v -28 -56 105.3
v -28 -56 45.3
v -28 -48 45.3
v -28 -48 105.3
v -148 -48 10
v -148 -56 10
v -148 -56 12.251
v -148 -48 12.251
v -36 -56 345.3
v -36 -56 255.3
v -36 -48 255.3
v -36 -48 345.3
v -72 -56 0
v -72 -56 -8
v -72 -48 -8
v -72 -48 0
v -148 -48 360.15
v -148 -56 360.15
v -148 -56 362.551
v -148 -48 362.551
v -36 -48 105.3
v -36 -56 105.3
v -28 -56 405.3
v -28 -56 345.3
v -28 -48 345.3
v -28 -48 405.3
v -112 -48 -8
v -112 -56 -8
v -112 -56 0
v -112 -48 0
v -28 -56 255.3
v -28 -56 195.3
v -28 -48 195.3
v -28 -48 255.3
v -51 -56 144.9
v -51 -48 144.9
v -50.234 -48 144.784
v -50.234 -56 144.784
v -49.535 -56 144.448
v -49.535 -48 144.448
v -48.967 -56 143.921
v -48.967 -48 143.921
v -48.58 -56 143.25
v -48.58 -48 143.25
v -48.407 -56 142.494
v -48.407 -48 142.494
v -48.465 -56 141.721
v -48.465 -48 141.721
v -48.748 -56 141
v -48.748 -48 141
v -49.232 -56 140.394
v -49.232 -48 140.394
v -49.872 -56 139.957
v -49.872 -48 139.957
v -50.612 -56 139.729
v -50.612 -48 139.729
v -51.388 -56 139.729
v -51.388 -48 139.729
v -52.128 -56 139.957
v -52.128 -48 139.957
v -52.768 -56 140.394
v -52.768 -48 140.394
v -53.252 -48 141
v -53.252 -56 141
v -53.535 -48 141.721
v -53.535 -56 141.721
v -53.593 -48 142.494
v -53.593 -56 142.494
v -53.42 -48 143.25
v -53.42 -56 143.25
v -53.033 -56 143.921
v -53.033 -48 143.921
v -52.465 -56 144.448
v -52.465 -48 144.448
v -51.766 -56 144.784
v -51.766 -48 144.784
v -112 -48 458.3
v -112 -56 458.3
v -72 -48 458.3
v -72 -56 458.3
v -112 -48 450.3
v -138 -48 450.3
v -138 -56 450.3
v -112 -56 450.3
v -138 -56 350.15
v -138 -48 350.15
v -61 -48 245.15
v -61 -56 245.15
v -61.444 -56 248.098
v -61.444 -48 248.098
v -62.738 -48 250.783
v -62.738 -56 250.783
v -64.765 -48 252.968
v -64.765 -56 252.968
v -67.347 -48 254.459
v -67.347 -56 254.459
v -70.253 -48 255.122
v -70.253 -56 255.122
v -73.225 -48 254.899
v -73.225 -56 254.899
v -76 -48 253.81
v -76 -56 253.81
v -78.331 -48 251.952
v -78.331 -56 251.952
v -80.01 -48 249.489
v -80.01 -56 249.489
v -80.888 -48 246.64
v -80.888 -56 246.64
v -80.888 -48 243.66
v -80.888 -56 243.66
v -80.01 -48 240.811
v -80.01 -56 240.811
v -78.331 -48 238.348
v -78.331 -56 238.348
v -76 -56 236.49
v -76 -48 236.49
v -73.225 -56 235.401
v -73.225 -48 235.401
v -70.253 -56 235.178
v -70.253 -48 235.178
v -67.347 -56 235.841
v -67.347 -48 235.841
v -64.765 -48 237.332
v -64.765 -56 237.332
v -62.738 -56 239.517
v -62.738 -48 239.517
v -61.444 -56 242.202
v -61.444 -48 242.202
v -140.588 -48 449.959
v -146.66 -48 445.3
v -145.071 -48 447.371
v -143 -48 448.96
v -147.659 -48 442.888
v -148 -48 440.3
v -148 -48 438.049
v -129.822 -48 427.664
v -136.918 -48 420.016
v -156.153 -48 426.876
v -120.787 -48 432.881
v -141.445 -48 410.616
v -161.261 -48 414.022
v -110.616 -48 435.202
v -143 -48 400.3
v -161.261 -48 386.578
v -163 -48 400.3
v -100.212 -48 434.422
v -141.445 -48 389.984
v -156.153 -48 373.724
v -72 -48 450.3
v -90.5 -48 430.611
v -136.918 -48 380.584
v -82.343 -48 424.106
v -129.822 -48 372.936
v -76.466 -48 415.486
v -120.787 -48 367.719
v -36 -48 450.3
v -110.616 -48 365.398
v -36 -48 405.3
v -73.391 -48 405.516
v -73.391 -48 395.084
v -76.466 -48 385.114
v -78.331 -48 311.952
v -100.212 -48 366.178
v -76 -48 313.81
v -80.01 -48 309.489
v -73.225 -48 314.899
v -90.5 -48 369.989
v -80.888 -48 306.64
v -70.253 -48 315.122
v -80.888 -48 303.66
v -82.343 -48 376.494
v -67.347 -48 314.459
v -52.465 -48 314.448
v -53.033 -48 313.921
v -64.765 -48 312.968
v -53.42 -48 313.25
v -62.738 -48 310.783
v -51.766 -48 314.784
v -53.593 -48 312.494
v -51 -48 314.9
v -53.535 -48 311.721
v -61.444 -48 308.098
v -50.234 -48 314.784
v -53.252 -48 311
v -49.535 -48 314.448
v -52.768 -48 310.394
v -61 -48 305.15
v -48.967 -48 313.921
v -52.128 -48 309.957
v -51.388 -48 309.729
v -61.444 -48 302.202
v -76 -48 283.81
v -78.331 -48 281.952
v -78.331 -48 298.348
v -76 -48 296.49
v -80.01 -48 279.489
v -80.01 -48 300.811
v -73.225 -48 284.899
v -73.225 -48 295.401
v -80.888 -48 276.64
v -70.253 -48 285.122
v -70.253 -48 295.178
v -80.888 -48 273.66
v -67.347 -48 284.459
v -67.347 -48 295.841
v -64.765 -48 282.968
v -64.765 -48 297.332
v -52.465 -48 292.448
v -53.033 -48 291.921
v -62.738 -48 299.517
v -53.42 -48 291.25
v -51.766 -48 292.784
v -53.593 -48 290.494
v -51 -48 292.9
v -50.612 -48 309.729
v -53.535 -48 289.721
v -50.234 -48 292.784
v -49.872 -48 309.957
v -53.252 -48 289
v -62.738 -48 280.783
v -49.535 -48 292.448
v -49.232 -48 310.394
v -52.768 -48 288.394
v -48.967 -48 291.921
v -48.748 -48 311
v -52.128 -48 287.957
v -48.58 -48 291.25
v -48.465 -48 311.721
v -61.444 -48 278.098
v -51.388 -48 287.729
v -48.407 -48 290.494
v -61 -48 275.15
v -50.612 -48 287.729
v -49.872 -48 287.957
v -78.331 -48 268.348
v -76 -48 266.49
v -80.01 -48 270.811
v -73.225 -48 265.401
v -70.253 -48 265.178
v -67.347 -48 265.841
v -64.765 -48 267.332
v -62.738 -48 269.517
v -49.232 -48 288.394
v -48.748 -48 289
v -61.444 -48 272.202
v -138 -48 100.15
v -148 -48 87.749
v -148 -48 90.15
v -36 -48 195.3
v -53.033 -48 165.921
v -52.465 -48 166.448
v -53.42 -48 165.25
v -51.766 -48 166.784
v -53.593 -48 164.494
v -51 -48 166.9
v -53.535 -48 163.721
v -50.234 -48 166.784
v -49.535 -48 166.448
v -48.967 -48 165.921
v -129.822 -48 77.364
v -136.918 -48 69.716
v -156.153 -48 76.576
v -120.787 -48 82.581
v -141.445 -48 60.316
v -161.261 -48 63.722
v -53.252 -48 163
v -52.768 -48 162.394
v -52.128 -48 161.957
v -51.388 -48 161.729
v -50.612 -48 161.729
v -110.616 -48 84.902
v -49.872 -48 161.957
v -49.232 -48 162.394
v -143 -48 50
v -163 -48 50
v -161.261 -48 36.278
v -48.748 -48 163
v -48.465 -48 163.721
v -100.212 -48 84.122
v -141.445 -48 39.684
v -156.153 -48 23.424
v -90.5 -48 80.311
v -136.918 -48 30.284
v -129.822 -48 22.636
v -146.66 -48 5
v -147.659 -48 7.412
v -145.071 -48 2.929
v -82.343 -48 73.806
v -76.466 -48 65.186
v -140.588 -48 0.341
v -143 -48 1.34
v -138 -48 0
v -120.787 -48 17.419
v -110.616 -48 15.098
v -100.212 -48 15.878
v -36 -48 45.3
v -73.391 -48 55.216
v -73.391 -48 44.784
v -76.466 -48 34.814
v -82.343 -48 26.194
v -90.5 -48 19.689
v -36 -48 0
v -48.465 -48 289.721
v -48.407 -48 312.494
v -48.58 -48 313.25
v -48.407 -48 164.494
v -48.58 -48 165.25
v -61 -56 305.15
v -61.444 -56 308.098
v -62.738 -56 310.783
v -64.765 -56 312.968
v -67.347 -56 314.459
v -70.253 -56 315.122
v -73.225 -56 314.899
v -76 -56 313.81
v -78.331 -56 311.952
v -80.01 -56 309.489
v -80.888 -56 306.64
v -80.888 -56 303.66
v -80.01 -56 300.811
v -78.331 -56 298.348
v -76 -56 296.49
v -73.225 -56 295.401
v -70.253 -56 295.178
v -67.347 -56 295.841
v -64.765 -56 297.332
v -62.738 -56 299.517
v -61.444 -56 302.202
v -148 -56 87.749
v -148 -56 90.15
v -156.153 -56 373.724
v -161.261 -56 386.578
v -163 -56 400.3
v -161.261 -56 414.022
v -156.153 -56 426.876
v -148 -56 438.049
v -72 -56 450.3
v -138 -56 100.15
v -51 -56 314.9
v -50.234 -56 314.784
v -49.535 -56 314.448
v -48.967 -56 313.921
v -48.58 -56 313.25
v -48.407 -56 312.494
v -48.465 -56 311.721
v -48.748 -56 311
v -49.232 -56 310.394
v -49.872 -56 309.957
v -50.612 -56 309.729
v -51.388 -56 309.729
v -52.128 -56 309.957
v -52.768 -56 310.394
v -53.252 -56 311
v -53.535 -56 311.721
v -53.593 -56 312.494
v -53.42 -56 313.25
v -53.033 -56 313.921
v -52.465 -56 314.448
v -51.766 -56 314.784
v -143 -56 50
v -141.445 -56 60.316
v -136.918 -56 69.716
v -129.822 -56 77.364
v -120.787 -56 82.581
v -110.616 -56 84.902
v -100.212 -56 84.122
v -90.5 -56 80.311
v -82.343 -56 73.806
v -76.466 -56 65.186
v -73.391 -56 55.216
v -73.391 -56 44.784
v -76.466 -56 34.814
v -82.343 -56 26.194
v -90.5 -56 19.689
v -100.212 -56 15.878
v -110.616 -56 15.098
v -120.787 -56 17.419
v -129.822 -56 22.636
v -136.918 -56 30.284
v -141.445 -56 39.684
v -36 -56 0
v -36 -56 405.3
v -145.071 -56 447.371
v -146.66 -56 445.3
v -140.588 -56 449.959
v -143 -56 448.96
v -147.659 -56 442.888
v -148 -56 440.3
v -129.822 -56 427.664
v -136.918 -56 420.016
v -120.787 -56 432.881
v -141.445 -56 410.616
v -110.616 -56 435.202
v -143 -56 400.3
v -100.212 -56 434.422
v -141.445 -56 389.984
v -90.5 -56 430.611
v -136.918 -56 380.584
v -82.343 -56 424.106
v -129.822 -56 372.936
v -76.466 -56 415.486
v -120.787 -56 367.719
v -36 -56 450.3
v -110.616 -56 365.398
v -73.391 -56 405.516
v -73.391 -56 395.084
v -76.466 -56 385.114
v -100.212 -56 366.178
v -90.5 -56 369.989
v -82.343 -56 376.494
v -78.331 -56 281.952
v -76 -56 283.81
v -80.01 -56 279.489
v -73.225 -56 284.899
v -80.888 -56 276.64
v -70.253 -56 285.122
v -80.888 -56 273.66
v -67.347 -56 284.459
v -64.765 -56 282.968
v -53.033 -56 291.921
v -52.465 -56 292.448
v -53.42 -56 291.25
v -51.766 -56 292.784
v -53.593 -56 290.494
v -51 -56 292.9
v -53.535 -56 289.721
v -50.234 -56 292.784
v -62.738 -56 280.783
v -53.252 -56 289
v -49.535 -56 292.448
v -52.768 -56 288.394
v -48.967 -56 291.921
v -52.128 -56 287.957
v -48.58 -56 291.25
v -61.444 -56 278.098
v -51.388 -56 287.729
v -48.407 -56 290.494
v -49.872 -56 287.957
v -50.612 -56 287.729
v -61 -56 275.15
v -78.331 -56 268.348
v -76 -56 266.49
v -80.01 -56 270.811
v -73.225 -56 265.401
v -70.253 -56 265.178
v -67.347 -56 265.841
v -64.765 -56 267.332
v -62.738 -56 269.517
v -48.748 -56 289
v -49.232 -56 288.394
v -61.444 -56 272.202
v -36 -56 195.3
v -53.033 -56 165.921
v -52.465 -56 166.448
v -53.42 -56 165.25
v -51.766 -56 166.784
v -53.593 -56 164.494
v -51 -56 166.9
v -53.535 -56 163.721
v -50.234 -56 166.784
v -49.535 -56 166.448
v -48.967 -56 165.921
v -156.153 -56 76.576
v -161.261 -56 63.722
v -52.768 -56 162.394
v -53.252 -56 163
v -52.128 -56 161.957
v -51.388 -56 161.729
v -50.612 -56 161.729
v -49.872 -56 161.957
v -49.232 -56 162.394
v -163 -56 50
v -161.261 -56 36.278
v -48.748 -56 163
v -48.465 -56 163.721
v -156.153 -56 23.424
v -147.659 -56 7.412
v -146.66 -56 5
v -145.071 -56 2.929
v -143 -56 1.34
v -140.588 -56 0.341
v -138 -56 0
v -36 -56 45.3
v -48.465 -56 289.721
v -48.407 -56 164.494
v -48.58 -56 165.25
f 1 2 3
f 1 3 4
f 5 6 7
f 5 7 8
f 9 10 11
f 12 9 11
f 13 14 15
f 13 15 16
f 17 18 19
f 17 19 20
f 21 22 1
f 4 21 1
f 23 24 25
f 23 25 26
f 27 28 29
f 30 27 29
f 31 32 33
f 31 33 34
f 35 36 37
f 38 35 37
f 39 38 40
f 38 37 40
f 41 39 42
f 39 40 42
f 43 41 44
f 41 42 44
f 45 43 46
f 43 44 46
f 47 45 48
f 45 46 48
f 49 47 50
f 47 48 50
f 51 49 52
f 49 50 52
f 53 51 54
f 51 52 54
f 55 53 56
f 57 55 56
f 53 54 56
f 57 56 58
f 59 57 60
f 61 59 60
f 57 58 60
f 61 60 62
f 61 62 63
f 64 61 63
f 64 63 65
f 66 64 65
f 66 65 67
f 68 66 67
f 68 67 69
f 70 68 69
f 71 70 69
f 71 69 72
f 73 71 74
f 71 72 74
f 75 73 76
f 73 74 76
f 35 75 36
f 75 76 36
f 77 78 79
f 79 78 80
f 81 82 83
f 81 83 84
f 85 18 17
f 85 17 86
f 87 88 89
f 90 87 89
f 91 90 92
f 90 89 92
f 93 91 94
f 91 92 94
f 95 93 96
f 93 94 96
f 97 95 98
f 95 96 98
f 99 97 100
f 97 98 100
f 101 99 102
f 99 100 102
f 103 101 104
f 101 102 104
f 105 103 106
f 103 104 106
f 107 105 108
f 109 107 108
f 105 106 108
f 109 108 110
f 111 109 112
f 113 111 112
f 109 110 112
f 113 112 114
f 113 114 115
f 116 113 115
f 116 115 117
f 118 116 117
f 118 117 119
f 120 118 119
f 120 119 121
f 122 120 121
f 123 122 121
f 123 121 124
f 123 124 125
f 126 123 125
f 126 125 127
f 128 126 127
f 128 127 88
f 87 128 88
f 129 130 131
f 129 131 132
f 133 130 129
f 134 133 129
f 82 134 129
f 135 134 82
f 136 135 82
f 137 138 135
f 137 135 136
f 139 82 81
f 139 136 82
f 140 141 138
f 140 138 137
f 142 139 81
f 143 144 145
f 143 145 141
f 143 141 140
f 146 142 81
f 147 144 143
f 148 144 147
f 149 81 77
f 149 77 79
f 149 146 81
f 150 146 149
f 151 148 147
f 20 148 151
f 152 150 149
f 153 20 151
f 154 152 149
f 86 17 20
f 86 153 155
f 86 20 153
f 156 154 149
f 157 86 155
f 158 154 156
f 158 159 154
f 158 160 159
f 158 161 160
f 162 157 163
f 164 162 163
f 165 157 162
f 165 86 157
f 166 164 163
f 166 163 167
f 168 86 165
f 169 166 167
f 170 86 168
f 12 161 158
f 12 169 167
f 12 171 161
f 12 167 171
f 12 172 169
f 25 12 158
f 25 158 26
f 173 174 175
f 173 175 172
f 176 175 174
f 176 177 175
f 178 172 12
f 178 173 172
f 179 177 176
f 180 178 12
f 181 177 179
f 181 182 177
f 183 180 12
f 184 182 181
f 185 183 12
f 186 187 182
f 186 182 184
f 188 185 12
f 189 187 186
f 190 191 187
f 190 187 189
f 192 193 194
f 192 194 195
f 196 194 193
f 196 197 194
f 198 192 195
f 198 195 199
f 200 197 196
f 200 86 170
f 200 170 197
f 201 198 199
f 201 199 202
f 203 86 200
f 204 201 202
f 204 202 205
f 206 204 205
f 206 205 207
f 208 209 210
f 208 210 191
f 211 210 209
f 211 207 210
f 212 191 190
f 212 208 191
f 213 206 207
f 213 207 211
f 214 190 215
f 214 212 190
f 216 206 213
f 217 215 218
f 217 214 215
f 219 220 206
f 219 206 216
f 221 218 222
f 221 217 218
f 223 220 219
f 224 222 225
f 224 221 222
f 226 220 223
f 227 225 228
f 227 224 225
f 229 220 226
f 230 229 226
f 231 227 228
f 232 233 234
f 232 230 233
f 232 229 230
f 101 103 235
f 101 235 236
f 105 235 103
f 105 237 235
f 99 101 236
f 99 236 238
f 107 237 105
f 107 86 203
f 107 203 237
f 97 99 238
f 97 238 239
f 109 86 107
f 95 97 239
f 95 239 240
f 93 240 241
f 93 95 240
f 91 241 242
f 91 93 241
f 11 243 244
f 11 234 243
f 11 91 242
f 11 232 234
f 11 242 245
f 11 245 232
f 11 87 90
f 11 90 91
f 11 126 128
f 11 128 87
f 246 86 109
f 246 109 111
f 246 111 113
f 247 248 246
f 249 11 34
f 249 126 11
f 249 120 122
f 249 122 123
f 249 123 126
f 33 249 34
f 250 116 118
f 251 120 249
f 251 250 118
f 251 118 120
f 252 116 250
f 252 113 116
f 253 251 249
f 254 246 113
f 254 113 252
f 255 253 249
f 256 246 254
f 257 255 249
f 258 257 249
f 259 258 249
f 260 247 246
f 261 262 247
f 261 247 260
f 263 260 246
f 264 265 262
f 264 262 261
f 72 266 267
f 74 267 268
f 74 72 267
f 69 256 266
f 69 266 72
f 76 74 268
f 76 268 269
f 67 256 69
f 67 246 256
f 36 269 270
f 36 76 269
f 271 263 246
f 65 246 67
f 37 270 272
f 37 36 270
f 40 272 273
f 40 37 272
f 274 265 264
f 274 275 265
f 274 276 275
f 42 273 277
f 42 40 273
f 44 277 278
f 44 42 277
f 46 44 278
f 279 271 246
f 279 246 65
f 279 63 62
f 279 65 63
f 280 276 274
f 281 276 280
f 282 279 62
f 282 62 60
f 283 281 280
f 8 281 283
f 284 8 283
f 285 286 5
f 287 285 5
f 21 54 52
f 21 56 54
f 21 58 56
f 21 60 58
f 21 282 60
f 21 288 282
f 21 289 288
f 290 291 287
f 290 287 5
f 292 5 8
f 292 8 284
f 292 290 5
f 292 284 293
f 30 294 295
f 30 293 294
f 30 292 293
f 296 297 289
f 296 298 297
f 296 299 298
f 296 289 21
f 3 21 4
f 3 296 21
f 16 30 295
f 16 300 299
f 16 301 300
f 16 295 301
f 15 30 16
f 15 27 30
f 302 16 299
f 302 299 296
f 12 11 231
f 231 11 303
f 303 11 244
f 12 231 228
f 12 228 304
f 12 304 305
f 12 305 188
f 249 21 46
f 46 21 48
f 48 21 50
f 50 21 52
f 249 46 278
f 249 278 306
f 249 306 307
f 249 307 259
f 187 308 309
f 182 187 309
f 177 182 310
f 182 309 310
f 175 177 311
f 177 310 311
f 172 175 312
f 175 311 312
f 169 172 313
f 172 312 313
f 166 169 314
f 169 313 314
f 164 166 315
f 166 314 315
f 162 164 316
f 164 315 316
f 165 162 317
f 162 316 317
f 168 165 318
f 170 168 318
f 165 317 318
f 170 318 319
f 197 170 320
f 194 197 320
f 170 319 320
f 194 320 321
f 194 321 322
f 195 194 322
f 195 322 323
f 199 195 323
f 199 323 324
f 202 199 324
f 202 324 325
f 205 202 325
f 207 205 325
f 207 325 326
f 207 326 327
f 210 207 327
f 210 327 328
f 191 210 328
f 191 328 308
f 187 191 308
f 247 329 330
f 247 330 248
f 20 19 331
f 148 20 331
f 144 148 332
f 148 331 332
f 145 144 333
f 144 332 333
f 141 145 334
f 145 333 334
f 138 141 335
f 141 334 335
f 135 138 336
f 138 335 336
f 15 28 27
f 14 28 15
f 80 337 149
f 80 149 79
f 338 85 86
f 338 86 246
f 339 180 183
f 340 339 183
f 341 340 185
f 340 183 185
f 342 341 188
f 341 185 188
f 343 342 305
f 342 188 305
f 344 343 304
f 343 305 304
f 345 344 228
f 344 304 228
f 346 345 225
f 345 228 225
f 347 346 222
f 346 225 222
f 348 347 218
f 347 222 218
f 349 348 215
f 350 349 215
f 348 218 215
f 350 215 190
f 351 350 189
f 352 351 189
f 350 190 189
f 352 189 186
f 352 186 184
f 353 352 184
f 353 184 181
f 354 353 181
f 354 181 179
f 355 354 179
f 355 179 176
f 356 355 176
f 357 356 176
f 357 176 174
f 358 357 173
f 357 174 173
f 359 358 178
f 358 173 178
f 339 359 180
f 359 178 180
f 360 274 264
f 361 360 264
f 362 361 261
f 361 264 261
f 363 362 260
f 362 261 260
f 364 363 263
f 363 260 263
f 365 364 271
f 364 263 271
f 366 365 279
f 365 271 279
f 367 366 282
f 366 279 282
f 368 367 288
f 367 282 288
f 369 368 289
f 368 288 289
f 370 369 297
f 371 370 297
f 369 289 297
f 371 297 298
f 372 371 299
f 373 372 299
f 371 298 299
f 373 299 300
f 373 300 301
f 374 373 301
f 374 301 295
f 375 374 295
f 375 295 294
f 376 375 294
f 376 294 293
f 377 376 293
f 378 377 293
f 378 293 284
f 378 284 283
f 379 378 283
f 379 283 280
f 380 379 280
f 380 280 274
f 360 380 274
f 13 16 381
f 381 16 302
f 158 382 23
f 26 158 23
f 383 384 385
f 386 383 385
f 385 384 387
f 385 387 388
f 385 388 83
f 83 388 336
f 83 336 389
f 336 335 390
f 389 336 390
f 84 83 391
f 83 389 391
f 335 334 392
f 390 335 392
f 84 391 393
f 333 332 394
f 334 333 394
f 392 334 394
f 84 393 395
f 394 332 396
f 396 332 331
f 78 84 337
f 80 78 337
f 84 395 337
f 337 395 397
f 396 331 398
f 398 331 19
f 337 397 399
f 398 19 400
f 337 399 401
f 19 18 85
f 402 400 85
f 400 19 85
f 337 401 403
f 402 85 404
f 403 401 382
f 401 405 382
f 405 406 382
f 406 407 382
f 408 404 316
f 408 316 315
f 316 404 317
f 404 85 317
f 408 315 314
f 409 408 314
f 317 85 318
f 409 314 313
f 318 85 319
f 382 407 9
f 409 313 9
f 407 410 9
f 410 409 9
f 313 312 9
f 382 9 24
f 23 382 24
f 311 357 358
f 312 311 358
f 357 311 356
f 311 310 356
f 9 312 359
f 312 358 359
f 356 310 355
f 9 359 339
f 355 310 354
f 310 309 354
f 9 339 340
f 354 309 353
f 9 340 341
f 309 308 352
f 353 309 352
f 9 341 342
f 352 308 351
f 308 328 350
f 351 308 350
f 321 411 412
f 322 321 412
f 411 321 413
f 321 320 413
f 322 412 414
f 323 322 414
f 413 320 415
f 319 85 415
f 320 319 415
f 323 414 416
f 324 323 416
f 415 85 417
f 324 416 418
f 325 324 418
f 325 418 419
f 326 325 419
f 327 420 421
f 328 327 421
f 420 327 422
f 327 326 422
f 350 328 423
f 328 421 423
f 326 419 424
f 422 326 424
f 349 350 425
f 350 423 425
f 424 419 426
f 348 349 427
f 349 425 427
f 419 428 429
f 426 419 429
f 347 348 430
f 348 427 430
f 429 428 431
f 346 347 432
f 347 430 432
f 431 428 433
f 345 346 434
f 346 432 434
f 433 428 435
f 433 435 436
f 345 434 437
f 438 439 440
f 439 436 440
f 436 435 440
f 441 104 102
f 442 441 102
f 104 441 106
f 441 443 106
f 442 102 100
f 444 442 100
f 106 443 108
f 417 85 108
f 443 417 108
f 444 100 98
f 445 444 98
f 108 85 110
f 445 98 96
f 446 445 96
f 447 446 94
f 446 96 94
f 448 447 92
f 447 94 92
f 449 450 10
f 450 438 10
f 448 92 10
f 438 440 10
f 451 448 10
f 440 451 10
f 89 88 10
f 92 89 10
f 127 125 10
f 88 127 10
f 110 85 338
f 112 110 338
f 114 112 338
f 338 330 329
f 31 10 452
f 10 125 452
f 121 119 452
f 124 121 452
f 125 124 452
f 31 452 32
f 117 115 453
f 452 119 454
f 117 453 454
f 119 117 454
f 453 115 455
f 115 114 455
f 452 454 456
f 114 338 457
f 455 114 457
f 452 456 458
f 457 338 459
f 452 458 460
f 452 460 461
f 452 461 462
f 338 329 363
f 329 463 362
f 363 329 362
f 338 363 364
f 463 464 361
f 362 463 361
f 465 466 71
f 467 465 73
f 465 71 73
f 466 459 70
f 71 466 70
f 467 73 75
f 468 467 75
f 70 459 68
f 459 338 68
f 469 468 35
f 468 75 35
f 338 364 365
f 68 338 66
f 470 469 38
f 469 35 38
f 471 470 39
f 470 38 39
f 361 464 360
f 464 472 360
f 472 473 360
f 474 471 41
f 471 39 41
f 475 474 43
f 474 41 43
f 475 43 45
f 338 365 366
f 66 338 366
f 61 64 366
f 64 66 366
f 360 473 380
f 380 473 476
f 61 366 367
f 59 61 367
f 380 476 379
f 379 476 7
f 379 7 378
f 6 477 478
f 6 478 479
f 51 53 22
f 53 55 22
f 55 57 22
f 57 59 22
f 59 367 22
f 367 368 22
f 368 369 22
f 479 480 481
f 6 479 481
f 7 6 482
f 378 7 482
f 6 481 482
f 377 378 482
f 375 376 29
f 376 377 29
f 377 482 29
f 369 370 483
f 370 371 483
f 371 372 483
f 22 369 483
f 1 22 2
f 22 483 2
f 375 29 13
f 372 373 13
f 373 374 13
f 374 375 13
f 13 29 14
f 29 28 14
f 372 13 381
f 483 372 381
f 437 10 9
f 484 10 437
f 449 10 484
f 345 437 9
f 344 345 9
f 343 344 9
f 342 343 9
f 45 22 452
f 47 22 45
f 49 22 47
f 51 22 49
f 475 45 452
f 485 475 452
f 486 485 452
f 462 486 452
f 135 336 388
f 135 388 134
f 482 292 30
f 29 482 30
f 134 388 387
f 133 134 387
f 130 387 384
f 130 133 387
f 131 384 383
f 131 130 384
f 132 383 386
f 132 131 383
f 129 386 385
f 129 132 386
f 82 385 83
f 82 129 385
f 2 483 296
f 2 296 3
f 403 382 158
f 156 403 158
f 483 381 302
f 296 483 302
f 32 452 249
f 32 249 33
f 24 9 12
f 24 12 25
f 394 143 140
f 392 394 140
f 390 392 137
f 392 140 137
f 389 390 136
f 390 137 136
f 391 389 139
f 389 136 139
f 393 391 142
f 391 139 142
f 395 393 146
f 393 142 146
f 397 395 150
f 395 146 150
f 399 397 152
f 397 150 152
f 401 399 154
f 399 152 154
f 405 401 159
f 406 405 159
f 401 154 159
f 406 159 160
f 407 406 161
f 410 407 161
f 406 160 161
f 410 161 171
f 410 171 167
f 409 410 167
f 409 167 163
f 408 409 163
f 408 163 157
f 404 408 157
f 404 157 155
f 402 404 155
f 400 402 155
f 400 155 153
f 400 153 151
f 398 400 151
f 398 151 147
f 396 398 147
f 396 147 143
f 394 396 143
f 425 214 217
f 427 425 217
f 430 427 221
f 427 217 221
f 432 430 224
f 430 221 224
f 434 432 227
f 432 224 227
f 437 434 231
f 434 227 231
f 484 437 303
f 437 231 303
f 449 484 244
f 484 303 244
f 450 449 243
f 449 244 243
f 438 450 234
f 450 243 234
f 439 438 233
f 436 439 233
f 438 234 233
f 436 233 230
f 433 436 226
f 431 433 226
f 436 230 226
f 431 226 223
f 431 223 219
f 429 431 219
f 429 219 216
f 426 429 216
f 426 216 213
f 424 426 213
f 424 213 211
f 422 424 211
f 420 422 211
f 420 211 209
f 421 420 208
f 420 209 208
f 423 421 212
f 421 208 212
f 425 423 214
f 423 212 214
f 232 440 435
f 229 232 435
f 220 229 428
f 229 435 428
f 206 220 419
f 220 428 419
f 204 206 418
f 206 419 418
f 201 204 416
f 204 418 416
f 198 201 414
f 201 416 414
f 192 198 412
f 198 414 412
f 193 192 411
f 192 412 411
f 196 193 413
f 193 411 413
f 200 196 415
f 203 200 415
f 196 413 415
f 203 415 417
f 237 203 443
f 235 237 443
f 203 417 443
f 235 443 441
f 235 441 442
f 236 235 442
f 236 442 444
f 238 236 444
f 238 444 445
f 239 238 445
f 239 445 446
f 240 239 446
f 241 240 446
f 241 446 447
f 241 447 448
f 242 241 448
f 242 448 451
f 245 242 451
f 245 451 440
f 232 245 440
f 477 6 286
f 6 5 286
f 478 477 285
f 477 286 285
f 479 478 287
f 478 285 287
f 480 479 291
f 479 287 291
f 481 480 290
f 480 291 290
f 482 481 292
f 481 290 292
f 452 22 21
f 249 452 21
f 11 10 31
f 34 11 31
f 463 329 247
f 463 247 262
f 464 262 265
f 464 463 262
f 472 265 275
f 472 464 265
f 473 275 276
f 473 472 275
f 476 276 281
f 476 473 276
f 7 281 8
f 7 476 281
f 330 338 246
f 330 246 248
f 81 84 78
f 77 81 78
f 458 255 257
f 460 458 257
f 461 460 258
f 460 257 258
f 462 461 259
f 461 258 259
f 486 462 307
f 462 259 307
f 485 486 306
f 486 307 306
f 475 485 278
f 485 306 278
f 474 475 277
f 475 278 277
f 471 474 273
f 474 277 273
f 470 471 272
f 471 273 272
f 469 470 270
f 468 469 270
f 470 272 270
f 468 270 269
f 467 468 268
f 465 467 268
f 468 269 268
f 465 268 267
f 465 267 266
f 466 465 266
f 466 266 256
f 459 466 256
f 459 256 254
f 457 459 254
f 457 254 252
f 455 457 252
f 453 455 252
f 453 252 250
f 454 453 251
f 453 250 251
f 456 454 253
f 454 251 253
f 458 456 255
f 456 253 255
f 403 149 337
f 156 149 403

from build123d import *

# Parameters (mm, degrees)
ESQUISSE1_W             = 112
ESQUISSE1_H             = 8
BOSS_EXTRU_1_DEPTH      = 450.3
ENL_V_MAT_EXTRU_1_DEPTH = 10
ESQUISSE3_W             = 40
ESQUISSE3_H             = 8
BOSS_EXTRU_2_DEPTH      = 8
ESQUISSE4_R             = 35
ENL_V_MAT_EXTRU_2_DEPTH = 10
ESQUISSE5_W             = 8
ESQUISSE5_H             = 60
BOSS_EXTRU_3_DEPTH      = 8
BOSS_EXTRU_5_DEPTH      = 8
CONG_1_R                = 10
ESQUISSE8_R             = 2.6
ENL_V_MAT_EXTRU_3_DEPTH = 8
ESQUISSE9_R             = 10
ENL_V_MAT_EXTRU_4_DEPTH = 10


with BuildPart() as part:
    # Esquisse1 → Boss.-Extru.1 (new body)
    with BuildSketch(Plane.XY):
        with Locations((-92, -52)):
            Rectangle(ESQUISSE1_W, ESQUISSE1_H)
    extrude(amount=BOSS_EXTRU_1_DEPTH)

    # Esquisse2 → Enlèv. mat.-Extru.1 (cut)
    with BuildSketch(Plane.XZ.offset(56)):
        Polygon((-148, 360.15), (-138, 350.15), (-138, 100.15), (-148, 90.15), align=None)
    extrude(amount=-ENL_V_MAT_EXTRU_1_DEPTH, mode=Mode.SUBTRACT)

    # Esquisse3 → Boss.-Extru.2 (add)
    with BuildSketch(Plane.XZ.offset(56)):
        with Locations((-92, 454.3)):
            Rectangle(ESQUISSE3_W, ESQUISSE3_H)
        with Locations((-92, -4)):
            Rectangle(ESQUISSE3_W, ESQUISSE3_H)
    extrude(amount=-BOSS_EXTRU_2_DEPTH)

    # Esquisse4 → Enlèv. mat.-Extru.2 (cut)
    with BuildSketch(Plane(origin=(0, -48, 0), x_dir=(1, 0, 0), z_dir=(0, 1, 0))):
        with Locations(Location((-108, -50, 0), (0, 0, 180))):
            Circle(ESQUISSE4_R)
        with Locations(Location((-108, -400.3, 0), (0, 0, 180))):
            Circle(ESQUISSE4_R)
    extrude(amount=-ENL_V_MAT_EXTRU_2_DEPTH, mode=Mode.SUBTRACT)

    # Esquisse5 → Boss.-Extru.3 (add)
    with BuildSketch(Plane.XZ.offset(56)):
        with Locations((-32, 225.3)):
            Rectangle(ESQUISSE5_W, ESQUISSE5_H)
        with Locations((-32, 375.3)):
            Rectangle(ESQUISSE5_W, ESQUISSE5_H)
        with Locations((-32, 75.3)):
            Rectangle(ESQUISSE5_W, ESQUISSE5_H)
    extrude(amount=-BOSS_EXTRU_3_DEPTH)

    # Esquisse7 → Boss.-Extru.5 (add)
    with BuildSketch(Plane.XZ.offset(56)):
        with BuildLine():
            Line((-148, 438.049172176), (-148, 362.550827824))
            ThreePointArc((-148, 362.550827824), (-163, 400.3), (-148, 438.049172176))
        make_face()
        with BuildLine():
            Line((-148, 12.250827824), (-148, 87.749172176))
            ThreePointArc((-148, 87.749172176), (-163, 50), (-148, 12.250827824))
        make_face()
    extrude(amount=-BOSS_EXTRU_5_DEPTH)

    # Congé1
    cong_1_edges = [part.edges().sort_by_distance(p)[0] for p in [
        (-148, -52, 0),
        (-148, -52, 450.3),
    ]]
    fillet(cong_1_edges, radius=CONG_1_R)

    # Esquisse8 → Enlèv. mat.-Extru.3 (cut)
    with BuildSketch(Plane(origin=(0, -48, 0), x_dir=(1, 0, 0), z_dir=(0, 1, 0))):
        with Locations(Location((-51, -142.3, 0), (0, 0, 270))):
            Circle(ESQUISSE8_R)
        with Locations(Location((-51, -164.3, 0), (0, 0, 270))):
            Circle(ESQUISSE8_R)
        with Locations(Location((-51, -312.3, 0), (0, 0, 270))):
            Circle(ESQUISSE8_R)
        with Locations(Location((-51, -290.3, 0), (0, 0, 270))):
            Circle(ESQUISSE8_R)
    extrude(amount=-ENL_V_MAT_EXTRU_3_DEPTH, mode=Mode.SUBTRACT)

    # Esquisse9 → Enlèv. mat.-Extru.4 (cut)
    with BuildSketch(Plane.XZ.offset(56)):
        with Locations((-71, 305.15)):
            Circle(ESQUISSE9_R)
        with Locations((-71, 275.15)):
            Circle(ESQUISSE9_R)
        with Locations((-71, 245.15)):
            Circle(ESQUISSE9_R)
    extrude(amount=-ENL_V_MAT_EXTRU_4_DEPTH, mode=Mode.SUBTRACT)


solid = part.part
